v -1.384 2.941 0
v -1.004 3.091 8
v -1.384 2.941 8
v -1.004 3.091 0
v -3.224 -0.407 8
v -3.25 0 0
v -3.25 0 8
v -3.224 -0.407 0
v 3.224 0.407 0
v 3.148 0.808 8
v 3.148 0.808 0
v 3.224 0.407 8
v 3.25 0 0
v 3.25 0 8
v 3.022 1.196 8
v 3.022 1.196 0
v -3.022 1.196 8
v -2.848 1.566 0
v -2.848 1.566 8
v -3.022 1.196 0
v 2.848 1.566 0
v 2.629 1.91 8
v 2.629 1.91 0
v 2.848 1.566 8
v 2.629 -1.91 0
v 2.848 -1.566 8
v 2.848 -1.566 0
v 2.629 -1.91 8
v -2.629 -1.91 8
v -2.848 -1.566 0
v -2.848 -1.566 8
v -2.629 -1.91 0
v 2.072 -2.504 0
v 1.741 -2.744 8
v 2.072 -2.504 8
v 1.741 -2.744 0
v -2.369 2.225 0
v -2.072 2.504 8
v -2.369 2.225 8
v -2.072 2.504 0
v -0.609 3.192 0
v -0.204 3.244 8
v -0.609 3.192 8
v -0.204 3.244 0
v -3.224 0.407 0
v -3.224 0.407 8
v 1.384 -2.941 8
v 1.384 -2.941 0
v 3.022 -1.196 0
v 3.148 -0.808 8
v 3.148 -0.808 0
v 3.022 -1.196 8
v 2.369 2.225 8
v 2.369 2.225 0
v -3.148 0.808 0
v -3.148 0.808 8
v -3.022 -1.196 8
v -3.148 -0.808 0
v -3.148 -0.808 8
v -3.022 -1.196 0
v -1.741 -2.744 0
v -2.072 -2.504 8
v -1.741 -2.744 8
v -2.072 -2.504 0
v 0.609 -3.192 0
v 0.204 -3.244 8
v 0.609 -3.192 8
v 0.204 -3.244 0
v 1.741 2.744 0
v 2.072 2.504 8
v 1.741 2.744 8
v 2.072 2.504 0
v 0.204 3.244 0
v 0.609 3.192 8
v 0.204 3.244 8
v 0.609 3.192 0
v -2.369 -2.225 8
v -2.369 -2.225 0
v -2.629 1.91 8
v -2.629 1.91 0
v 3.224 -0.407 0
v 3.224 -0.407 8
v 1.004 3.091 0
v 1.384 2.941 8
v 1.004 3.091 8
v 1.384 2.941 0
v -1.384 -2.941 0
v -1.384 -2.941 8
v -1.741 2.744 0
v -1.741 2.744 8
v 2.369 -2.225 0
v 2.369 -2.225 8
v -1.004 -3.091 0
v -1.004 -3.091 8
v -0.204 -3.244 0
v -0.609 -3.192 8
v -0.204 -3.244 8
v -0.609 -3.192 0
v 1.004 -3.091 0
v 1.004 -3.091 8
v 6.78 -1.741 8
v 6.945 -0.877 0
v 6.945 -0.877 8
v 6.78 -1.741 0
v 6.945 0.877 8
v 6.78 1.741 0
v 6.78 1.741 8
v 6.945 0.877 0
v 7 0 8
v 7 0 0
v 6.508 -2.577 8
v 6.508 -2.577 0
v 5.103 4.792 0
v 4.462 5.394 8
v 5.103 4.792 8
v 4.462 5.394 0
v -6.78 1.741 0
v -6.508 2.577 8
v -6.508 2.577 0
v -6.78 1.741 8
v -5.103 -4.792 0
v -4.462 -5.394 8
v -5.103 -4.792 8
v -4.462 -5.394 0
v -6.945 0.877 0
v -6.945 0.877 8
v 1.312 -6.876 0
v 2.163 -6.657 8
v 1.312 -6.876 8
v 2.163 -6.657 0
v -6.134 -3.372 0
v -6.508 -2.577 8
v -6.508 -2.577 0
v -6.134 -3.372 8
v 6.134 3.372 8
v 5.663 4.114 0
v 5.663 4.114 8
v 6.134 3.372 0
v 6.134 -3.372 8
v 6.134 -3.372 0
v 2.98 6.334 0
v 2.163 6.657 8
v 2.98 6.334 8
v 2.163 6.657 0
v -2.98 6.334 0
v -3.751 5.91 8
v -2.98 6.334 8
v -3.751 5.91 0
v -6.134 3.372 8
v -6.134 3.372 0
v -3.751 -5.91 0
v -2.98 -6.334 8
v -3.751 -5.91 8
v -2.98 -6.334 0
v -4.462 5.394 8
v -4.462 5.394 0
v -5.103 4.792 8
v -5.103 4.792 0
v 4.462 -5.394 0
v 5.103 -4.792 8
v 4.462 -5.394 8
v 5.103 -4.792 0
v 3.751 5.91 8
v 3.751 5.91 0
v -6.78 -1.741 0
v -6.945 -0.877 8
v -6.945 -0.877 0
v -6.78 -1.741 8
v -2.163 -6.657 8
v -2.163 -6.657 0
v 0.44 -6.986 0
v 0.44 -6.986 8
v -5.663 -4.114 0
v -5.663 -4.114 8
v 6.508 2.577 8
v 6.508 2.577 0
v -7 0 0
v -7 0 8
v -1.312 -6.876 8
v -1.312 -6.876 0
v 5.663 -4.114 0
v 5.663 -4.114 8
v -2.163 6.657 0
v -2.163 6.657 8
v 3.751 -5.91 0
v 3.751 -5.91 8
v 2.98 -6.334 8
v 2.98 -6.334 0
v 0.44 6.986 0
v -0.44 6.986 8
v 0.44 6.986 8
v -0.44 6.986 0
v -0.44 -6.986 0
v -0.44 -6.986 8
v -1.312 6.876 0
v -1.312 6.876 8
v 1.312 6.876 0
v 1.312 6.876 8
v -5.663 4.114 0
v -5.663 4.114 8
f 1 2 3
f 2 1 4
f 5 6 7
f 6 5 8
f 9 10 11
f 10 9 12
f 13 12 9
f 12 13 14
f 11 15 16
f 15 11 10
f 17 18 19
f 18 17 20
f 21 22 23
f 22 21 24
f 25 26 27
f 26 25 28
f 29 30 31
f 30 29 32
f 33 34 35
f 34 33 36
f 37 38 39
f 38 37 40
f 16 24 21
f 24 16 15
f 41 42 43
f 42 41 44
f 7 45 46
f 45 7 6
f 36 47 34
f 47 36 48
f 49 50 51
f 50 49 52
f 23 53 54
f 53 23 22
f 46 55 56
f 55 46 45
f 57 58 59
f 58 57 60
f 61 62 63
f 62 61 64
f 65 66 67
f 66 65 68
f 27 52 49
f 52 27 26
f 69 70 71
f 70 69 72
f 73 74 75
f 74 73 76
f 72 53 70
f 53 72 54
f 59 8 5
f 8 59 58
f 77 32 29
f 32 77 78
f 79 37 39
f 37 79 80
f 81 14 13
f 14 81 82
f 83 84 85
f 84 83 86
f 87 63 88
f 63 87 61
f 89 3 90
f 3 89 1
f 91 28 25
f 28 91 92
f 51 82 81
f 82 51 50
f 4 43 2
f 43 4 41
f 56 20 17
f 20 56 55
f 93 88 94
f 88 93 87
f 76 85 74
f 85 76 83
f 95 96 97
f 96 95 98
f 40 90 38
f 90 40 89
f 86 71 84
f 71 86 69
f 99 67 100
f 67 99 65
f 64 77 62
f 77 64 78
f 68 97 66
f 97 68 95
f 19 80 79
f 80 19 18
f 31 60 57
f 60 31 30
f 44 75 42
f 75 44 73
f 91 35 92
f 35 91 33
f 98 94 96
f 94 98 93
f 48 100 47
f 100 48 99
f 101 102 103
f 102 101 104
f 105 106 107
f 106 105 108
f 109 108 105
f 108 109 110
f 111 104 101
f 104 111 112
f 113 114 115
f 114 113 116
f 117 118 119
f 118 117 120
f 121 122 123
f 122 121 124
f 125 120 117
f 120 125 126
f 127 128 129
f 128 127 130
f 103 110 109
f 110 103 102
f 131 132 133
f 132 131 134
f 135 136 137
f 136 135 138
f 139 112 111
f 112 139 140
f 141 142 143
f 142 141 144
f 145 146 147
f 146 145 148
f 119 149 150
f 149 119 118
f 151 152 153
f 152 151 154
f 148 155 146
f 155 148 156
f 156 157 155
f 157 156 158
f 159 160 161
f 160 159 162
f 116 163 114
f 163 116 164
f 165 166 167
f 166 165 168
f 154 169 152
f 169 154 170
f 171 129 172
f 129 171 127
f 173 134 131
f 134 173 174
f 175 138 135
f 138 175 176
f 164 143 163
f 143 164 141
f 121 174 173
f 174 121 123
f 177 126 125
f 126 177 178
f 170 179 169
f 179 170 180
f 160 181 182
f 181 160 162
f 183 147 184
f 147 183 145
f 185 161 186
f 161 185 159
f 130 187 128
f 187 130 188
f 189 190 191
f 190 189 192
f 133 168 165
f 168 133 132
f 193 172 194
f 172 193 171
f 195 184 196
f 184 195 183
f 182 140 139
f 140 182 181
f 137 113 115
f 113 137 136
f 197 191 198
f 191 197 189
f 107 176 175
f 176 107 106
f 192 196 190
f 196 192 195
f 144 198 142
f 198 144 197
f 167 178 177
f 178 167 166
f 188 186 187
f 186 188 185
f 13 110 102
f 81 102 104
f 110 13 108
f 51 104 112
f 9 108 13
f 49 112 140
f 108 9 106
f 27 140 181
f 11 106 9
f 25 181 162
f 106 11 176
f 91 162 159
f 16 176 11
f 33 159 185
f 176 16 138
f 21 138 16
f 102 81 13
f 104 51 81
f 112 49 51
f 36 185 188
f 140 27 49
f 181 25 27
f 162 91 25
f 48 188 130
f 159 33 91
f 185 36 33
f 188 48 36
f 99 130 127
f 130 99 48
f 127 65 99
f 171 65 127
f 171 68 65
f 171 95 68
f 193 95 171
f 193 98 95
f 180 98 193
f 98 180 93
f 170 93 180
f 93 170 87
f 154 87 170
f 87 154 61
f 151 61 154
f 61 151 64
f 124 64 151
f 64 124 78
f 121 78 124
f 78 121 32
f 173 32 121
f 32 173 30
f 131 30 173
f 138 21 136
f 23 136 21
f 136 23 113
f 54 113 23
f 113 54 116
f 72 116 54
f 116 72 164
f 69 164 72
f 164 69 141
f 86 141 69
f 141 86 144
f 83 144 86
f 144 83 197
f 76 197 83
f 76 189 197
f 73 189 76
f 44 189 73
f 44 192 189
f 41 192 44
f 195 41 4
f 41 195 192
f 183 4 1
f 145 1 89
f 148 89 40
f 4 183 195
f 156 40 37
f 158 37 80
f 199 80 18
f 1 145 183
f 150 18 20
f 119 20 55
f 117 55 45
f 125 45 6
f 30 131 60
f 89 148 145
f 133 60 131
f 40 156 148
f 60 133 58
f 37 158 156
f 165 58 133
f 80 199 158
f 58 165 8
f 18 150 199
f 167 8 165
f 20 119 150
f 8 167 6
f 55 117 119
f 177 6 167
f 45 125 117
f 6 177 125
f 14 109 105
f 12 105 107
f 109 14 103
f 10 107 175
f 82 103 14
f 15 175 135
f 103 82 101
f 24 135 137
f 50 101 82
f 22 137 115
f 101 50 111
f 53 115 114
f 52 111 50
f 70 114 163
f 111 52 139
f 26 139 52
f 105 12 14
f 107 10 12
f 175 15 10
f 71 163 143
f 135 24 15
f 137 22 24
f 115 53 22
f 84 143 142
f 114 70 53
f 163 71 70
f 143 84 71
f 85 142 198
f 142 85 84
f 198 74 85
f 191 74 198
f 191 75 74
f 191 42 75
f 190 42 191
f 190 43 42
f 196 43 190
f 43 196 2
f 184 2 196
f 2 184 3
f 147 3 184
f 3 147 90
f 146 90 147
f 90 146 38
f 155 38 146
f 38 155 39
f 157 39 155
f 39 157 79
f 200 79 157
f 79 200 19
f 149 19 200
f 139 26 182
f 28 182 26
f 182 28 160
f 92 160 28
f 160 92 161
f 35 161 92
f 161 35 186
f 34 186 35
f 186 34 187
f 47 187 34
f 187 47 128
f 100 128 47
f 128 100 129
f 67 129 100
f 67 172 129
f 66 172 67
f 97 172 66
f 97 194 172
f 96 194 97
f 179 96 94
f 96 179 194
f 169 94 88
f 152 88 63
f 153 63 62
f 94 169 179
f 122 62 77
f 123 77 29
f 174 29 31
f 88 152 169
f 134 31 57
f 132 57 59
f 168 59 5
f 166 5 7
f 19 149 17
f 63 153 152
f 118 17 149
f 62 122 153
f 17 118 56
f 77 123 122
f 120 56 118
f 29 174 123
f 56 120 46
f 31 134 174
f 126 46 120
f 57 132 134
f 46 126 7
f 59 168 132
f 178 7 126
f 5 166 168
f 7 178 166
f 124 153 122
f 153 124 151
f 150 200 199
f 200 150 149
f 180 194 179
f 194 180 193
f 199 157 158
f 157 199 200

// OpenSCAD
$fn = 50;


difference() {
	union() {
		cylinder(h = 8, r = 7.0000000000);
	}
	union() {
		translate(v = [0, 0, -100]) {
			cylinder(h = 200, r = 3.2500000000);
		}
		translate(v = [0, 0, -100]) {
			cylinder(h = 200, r = 1.8000000000);
		}
	}
}
